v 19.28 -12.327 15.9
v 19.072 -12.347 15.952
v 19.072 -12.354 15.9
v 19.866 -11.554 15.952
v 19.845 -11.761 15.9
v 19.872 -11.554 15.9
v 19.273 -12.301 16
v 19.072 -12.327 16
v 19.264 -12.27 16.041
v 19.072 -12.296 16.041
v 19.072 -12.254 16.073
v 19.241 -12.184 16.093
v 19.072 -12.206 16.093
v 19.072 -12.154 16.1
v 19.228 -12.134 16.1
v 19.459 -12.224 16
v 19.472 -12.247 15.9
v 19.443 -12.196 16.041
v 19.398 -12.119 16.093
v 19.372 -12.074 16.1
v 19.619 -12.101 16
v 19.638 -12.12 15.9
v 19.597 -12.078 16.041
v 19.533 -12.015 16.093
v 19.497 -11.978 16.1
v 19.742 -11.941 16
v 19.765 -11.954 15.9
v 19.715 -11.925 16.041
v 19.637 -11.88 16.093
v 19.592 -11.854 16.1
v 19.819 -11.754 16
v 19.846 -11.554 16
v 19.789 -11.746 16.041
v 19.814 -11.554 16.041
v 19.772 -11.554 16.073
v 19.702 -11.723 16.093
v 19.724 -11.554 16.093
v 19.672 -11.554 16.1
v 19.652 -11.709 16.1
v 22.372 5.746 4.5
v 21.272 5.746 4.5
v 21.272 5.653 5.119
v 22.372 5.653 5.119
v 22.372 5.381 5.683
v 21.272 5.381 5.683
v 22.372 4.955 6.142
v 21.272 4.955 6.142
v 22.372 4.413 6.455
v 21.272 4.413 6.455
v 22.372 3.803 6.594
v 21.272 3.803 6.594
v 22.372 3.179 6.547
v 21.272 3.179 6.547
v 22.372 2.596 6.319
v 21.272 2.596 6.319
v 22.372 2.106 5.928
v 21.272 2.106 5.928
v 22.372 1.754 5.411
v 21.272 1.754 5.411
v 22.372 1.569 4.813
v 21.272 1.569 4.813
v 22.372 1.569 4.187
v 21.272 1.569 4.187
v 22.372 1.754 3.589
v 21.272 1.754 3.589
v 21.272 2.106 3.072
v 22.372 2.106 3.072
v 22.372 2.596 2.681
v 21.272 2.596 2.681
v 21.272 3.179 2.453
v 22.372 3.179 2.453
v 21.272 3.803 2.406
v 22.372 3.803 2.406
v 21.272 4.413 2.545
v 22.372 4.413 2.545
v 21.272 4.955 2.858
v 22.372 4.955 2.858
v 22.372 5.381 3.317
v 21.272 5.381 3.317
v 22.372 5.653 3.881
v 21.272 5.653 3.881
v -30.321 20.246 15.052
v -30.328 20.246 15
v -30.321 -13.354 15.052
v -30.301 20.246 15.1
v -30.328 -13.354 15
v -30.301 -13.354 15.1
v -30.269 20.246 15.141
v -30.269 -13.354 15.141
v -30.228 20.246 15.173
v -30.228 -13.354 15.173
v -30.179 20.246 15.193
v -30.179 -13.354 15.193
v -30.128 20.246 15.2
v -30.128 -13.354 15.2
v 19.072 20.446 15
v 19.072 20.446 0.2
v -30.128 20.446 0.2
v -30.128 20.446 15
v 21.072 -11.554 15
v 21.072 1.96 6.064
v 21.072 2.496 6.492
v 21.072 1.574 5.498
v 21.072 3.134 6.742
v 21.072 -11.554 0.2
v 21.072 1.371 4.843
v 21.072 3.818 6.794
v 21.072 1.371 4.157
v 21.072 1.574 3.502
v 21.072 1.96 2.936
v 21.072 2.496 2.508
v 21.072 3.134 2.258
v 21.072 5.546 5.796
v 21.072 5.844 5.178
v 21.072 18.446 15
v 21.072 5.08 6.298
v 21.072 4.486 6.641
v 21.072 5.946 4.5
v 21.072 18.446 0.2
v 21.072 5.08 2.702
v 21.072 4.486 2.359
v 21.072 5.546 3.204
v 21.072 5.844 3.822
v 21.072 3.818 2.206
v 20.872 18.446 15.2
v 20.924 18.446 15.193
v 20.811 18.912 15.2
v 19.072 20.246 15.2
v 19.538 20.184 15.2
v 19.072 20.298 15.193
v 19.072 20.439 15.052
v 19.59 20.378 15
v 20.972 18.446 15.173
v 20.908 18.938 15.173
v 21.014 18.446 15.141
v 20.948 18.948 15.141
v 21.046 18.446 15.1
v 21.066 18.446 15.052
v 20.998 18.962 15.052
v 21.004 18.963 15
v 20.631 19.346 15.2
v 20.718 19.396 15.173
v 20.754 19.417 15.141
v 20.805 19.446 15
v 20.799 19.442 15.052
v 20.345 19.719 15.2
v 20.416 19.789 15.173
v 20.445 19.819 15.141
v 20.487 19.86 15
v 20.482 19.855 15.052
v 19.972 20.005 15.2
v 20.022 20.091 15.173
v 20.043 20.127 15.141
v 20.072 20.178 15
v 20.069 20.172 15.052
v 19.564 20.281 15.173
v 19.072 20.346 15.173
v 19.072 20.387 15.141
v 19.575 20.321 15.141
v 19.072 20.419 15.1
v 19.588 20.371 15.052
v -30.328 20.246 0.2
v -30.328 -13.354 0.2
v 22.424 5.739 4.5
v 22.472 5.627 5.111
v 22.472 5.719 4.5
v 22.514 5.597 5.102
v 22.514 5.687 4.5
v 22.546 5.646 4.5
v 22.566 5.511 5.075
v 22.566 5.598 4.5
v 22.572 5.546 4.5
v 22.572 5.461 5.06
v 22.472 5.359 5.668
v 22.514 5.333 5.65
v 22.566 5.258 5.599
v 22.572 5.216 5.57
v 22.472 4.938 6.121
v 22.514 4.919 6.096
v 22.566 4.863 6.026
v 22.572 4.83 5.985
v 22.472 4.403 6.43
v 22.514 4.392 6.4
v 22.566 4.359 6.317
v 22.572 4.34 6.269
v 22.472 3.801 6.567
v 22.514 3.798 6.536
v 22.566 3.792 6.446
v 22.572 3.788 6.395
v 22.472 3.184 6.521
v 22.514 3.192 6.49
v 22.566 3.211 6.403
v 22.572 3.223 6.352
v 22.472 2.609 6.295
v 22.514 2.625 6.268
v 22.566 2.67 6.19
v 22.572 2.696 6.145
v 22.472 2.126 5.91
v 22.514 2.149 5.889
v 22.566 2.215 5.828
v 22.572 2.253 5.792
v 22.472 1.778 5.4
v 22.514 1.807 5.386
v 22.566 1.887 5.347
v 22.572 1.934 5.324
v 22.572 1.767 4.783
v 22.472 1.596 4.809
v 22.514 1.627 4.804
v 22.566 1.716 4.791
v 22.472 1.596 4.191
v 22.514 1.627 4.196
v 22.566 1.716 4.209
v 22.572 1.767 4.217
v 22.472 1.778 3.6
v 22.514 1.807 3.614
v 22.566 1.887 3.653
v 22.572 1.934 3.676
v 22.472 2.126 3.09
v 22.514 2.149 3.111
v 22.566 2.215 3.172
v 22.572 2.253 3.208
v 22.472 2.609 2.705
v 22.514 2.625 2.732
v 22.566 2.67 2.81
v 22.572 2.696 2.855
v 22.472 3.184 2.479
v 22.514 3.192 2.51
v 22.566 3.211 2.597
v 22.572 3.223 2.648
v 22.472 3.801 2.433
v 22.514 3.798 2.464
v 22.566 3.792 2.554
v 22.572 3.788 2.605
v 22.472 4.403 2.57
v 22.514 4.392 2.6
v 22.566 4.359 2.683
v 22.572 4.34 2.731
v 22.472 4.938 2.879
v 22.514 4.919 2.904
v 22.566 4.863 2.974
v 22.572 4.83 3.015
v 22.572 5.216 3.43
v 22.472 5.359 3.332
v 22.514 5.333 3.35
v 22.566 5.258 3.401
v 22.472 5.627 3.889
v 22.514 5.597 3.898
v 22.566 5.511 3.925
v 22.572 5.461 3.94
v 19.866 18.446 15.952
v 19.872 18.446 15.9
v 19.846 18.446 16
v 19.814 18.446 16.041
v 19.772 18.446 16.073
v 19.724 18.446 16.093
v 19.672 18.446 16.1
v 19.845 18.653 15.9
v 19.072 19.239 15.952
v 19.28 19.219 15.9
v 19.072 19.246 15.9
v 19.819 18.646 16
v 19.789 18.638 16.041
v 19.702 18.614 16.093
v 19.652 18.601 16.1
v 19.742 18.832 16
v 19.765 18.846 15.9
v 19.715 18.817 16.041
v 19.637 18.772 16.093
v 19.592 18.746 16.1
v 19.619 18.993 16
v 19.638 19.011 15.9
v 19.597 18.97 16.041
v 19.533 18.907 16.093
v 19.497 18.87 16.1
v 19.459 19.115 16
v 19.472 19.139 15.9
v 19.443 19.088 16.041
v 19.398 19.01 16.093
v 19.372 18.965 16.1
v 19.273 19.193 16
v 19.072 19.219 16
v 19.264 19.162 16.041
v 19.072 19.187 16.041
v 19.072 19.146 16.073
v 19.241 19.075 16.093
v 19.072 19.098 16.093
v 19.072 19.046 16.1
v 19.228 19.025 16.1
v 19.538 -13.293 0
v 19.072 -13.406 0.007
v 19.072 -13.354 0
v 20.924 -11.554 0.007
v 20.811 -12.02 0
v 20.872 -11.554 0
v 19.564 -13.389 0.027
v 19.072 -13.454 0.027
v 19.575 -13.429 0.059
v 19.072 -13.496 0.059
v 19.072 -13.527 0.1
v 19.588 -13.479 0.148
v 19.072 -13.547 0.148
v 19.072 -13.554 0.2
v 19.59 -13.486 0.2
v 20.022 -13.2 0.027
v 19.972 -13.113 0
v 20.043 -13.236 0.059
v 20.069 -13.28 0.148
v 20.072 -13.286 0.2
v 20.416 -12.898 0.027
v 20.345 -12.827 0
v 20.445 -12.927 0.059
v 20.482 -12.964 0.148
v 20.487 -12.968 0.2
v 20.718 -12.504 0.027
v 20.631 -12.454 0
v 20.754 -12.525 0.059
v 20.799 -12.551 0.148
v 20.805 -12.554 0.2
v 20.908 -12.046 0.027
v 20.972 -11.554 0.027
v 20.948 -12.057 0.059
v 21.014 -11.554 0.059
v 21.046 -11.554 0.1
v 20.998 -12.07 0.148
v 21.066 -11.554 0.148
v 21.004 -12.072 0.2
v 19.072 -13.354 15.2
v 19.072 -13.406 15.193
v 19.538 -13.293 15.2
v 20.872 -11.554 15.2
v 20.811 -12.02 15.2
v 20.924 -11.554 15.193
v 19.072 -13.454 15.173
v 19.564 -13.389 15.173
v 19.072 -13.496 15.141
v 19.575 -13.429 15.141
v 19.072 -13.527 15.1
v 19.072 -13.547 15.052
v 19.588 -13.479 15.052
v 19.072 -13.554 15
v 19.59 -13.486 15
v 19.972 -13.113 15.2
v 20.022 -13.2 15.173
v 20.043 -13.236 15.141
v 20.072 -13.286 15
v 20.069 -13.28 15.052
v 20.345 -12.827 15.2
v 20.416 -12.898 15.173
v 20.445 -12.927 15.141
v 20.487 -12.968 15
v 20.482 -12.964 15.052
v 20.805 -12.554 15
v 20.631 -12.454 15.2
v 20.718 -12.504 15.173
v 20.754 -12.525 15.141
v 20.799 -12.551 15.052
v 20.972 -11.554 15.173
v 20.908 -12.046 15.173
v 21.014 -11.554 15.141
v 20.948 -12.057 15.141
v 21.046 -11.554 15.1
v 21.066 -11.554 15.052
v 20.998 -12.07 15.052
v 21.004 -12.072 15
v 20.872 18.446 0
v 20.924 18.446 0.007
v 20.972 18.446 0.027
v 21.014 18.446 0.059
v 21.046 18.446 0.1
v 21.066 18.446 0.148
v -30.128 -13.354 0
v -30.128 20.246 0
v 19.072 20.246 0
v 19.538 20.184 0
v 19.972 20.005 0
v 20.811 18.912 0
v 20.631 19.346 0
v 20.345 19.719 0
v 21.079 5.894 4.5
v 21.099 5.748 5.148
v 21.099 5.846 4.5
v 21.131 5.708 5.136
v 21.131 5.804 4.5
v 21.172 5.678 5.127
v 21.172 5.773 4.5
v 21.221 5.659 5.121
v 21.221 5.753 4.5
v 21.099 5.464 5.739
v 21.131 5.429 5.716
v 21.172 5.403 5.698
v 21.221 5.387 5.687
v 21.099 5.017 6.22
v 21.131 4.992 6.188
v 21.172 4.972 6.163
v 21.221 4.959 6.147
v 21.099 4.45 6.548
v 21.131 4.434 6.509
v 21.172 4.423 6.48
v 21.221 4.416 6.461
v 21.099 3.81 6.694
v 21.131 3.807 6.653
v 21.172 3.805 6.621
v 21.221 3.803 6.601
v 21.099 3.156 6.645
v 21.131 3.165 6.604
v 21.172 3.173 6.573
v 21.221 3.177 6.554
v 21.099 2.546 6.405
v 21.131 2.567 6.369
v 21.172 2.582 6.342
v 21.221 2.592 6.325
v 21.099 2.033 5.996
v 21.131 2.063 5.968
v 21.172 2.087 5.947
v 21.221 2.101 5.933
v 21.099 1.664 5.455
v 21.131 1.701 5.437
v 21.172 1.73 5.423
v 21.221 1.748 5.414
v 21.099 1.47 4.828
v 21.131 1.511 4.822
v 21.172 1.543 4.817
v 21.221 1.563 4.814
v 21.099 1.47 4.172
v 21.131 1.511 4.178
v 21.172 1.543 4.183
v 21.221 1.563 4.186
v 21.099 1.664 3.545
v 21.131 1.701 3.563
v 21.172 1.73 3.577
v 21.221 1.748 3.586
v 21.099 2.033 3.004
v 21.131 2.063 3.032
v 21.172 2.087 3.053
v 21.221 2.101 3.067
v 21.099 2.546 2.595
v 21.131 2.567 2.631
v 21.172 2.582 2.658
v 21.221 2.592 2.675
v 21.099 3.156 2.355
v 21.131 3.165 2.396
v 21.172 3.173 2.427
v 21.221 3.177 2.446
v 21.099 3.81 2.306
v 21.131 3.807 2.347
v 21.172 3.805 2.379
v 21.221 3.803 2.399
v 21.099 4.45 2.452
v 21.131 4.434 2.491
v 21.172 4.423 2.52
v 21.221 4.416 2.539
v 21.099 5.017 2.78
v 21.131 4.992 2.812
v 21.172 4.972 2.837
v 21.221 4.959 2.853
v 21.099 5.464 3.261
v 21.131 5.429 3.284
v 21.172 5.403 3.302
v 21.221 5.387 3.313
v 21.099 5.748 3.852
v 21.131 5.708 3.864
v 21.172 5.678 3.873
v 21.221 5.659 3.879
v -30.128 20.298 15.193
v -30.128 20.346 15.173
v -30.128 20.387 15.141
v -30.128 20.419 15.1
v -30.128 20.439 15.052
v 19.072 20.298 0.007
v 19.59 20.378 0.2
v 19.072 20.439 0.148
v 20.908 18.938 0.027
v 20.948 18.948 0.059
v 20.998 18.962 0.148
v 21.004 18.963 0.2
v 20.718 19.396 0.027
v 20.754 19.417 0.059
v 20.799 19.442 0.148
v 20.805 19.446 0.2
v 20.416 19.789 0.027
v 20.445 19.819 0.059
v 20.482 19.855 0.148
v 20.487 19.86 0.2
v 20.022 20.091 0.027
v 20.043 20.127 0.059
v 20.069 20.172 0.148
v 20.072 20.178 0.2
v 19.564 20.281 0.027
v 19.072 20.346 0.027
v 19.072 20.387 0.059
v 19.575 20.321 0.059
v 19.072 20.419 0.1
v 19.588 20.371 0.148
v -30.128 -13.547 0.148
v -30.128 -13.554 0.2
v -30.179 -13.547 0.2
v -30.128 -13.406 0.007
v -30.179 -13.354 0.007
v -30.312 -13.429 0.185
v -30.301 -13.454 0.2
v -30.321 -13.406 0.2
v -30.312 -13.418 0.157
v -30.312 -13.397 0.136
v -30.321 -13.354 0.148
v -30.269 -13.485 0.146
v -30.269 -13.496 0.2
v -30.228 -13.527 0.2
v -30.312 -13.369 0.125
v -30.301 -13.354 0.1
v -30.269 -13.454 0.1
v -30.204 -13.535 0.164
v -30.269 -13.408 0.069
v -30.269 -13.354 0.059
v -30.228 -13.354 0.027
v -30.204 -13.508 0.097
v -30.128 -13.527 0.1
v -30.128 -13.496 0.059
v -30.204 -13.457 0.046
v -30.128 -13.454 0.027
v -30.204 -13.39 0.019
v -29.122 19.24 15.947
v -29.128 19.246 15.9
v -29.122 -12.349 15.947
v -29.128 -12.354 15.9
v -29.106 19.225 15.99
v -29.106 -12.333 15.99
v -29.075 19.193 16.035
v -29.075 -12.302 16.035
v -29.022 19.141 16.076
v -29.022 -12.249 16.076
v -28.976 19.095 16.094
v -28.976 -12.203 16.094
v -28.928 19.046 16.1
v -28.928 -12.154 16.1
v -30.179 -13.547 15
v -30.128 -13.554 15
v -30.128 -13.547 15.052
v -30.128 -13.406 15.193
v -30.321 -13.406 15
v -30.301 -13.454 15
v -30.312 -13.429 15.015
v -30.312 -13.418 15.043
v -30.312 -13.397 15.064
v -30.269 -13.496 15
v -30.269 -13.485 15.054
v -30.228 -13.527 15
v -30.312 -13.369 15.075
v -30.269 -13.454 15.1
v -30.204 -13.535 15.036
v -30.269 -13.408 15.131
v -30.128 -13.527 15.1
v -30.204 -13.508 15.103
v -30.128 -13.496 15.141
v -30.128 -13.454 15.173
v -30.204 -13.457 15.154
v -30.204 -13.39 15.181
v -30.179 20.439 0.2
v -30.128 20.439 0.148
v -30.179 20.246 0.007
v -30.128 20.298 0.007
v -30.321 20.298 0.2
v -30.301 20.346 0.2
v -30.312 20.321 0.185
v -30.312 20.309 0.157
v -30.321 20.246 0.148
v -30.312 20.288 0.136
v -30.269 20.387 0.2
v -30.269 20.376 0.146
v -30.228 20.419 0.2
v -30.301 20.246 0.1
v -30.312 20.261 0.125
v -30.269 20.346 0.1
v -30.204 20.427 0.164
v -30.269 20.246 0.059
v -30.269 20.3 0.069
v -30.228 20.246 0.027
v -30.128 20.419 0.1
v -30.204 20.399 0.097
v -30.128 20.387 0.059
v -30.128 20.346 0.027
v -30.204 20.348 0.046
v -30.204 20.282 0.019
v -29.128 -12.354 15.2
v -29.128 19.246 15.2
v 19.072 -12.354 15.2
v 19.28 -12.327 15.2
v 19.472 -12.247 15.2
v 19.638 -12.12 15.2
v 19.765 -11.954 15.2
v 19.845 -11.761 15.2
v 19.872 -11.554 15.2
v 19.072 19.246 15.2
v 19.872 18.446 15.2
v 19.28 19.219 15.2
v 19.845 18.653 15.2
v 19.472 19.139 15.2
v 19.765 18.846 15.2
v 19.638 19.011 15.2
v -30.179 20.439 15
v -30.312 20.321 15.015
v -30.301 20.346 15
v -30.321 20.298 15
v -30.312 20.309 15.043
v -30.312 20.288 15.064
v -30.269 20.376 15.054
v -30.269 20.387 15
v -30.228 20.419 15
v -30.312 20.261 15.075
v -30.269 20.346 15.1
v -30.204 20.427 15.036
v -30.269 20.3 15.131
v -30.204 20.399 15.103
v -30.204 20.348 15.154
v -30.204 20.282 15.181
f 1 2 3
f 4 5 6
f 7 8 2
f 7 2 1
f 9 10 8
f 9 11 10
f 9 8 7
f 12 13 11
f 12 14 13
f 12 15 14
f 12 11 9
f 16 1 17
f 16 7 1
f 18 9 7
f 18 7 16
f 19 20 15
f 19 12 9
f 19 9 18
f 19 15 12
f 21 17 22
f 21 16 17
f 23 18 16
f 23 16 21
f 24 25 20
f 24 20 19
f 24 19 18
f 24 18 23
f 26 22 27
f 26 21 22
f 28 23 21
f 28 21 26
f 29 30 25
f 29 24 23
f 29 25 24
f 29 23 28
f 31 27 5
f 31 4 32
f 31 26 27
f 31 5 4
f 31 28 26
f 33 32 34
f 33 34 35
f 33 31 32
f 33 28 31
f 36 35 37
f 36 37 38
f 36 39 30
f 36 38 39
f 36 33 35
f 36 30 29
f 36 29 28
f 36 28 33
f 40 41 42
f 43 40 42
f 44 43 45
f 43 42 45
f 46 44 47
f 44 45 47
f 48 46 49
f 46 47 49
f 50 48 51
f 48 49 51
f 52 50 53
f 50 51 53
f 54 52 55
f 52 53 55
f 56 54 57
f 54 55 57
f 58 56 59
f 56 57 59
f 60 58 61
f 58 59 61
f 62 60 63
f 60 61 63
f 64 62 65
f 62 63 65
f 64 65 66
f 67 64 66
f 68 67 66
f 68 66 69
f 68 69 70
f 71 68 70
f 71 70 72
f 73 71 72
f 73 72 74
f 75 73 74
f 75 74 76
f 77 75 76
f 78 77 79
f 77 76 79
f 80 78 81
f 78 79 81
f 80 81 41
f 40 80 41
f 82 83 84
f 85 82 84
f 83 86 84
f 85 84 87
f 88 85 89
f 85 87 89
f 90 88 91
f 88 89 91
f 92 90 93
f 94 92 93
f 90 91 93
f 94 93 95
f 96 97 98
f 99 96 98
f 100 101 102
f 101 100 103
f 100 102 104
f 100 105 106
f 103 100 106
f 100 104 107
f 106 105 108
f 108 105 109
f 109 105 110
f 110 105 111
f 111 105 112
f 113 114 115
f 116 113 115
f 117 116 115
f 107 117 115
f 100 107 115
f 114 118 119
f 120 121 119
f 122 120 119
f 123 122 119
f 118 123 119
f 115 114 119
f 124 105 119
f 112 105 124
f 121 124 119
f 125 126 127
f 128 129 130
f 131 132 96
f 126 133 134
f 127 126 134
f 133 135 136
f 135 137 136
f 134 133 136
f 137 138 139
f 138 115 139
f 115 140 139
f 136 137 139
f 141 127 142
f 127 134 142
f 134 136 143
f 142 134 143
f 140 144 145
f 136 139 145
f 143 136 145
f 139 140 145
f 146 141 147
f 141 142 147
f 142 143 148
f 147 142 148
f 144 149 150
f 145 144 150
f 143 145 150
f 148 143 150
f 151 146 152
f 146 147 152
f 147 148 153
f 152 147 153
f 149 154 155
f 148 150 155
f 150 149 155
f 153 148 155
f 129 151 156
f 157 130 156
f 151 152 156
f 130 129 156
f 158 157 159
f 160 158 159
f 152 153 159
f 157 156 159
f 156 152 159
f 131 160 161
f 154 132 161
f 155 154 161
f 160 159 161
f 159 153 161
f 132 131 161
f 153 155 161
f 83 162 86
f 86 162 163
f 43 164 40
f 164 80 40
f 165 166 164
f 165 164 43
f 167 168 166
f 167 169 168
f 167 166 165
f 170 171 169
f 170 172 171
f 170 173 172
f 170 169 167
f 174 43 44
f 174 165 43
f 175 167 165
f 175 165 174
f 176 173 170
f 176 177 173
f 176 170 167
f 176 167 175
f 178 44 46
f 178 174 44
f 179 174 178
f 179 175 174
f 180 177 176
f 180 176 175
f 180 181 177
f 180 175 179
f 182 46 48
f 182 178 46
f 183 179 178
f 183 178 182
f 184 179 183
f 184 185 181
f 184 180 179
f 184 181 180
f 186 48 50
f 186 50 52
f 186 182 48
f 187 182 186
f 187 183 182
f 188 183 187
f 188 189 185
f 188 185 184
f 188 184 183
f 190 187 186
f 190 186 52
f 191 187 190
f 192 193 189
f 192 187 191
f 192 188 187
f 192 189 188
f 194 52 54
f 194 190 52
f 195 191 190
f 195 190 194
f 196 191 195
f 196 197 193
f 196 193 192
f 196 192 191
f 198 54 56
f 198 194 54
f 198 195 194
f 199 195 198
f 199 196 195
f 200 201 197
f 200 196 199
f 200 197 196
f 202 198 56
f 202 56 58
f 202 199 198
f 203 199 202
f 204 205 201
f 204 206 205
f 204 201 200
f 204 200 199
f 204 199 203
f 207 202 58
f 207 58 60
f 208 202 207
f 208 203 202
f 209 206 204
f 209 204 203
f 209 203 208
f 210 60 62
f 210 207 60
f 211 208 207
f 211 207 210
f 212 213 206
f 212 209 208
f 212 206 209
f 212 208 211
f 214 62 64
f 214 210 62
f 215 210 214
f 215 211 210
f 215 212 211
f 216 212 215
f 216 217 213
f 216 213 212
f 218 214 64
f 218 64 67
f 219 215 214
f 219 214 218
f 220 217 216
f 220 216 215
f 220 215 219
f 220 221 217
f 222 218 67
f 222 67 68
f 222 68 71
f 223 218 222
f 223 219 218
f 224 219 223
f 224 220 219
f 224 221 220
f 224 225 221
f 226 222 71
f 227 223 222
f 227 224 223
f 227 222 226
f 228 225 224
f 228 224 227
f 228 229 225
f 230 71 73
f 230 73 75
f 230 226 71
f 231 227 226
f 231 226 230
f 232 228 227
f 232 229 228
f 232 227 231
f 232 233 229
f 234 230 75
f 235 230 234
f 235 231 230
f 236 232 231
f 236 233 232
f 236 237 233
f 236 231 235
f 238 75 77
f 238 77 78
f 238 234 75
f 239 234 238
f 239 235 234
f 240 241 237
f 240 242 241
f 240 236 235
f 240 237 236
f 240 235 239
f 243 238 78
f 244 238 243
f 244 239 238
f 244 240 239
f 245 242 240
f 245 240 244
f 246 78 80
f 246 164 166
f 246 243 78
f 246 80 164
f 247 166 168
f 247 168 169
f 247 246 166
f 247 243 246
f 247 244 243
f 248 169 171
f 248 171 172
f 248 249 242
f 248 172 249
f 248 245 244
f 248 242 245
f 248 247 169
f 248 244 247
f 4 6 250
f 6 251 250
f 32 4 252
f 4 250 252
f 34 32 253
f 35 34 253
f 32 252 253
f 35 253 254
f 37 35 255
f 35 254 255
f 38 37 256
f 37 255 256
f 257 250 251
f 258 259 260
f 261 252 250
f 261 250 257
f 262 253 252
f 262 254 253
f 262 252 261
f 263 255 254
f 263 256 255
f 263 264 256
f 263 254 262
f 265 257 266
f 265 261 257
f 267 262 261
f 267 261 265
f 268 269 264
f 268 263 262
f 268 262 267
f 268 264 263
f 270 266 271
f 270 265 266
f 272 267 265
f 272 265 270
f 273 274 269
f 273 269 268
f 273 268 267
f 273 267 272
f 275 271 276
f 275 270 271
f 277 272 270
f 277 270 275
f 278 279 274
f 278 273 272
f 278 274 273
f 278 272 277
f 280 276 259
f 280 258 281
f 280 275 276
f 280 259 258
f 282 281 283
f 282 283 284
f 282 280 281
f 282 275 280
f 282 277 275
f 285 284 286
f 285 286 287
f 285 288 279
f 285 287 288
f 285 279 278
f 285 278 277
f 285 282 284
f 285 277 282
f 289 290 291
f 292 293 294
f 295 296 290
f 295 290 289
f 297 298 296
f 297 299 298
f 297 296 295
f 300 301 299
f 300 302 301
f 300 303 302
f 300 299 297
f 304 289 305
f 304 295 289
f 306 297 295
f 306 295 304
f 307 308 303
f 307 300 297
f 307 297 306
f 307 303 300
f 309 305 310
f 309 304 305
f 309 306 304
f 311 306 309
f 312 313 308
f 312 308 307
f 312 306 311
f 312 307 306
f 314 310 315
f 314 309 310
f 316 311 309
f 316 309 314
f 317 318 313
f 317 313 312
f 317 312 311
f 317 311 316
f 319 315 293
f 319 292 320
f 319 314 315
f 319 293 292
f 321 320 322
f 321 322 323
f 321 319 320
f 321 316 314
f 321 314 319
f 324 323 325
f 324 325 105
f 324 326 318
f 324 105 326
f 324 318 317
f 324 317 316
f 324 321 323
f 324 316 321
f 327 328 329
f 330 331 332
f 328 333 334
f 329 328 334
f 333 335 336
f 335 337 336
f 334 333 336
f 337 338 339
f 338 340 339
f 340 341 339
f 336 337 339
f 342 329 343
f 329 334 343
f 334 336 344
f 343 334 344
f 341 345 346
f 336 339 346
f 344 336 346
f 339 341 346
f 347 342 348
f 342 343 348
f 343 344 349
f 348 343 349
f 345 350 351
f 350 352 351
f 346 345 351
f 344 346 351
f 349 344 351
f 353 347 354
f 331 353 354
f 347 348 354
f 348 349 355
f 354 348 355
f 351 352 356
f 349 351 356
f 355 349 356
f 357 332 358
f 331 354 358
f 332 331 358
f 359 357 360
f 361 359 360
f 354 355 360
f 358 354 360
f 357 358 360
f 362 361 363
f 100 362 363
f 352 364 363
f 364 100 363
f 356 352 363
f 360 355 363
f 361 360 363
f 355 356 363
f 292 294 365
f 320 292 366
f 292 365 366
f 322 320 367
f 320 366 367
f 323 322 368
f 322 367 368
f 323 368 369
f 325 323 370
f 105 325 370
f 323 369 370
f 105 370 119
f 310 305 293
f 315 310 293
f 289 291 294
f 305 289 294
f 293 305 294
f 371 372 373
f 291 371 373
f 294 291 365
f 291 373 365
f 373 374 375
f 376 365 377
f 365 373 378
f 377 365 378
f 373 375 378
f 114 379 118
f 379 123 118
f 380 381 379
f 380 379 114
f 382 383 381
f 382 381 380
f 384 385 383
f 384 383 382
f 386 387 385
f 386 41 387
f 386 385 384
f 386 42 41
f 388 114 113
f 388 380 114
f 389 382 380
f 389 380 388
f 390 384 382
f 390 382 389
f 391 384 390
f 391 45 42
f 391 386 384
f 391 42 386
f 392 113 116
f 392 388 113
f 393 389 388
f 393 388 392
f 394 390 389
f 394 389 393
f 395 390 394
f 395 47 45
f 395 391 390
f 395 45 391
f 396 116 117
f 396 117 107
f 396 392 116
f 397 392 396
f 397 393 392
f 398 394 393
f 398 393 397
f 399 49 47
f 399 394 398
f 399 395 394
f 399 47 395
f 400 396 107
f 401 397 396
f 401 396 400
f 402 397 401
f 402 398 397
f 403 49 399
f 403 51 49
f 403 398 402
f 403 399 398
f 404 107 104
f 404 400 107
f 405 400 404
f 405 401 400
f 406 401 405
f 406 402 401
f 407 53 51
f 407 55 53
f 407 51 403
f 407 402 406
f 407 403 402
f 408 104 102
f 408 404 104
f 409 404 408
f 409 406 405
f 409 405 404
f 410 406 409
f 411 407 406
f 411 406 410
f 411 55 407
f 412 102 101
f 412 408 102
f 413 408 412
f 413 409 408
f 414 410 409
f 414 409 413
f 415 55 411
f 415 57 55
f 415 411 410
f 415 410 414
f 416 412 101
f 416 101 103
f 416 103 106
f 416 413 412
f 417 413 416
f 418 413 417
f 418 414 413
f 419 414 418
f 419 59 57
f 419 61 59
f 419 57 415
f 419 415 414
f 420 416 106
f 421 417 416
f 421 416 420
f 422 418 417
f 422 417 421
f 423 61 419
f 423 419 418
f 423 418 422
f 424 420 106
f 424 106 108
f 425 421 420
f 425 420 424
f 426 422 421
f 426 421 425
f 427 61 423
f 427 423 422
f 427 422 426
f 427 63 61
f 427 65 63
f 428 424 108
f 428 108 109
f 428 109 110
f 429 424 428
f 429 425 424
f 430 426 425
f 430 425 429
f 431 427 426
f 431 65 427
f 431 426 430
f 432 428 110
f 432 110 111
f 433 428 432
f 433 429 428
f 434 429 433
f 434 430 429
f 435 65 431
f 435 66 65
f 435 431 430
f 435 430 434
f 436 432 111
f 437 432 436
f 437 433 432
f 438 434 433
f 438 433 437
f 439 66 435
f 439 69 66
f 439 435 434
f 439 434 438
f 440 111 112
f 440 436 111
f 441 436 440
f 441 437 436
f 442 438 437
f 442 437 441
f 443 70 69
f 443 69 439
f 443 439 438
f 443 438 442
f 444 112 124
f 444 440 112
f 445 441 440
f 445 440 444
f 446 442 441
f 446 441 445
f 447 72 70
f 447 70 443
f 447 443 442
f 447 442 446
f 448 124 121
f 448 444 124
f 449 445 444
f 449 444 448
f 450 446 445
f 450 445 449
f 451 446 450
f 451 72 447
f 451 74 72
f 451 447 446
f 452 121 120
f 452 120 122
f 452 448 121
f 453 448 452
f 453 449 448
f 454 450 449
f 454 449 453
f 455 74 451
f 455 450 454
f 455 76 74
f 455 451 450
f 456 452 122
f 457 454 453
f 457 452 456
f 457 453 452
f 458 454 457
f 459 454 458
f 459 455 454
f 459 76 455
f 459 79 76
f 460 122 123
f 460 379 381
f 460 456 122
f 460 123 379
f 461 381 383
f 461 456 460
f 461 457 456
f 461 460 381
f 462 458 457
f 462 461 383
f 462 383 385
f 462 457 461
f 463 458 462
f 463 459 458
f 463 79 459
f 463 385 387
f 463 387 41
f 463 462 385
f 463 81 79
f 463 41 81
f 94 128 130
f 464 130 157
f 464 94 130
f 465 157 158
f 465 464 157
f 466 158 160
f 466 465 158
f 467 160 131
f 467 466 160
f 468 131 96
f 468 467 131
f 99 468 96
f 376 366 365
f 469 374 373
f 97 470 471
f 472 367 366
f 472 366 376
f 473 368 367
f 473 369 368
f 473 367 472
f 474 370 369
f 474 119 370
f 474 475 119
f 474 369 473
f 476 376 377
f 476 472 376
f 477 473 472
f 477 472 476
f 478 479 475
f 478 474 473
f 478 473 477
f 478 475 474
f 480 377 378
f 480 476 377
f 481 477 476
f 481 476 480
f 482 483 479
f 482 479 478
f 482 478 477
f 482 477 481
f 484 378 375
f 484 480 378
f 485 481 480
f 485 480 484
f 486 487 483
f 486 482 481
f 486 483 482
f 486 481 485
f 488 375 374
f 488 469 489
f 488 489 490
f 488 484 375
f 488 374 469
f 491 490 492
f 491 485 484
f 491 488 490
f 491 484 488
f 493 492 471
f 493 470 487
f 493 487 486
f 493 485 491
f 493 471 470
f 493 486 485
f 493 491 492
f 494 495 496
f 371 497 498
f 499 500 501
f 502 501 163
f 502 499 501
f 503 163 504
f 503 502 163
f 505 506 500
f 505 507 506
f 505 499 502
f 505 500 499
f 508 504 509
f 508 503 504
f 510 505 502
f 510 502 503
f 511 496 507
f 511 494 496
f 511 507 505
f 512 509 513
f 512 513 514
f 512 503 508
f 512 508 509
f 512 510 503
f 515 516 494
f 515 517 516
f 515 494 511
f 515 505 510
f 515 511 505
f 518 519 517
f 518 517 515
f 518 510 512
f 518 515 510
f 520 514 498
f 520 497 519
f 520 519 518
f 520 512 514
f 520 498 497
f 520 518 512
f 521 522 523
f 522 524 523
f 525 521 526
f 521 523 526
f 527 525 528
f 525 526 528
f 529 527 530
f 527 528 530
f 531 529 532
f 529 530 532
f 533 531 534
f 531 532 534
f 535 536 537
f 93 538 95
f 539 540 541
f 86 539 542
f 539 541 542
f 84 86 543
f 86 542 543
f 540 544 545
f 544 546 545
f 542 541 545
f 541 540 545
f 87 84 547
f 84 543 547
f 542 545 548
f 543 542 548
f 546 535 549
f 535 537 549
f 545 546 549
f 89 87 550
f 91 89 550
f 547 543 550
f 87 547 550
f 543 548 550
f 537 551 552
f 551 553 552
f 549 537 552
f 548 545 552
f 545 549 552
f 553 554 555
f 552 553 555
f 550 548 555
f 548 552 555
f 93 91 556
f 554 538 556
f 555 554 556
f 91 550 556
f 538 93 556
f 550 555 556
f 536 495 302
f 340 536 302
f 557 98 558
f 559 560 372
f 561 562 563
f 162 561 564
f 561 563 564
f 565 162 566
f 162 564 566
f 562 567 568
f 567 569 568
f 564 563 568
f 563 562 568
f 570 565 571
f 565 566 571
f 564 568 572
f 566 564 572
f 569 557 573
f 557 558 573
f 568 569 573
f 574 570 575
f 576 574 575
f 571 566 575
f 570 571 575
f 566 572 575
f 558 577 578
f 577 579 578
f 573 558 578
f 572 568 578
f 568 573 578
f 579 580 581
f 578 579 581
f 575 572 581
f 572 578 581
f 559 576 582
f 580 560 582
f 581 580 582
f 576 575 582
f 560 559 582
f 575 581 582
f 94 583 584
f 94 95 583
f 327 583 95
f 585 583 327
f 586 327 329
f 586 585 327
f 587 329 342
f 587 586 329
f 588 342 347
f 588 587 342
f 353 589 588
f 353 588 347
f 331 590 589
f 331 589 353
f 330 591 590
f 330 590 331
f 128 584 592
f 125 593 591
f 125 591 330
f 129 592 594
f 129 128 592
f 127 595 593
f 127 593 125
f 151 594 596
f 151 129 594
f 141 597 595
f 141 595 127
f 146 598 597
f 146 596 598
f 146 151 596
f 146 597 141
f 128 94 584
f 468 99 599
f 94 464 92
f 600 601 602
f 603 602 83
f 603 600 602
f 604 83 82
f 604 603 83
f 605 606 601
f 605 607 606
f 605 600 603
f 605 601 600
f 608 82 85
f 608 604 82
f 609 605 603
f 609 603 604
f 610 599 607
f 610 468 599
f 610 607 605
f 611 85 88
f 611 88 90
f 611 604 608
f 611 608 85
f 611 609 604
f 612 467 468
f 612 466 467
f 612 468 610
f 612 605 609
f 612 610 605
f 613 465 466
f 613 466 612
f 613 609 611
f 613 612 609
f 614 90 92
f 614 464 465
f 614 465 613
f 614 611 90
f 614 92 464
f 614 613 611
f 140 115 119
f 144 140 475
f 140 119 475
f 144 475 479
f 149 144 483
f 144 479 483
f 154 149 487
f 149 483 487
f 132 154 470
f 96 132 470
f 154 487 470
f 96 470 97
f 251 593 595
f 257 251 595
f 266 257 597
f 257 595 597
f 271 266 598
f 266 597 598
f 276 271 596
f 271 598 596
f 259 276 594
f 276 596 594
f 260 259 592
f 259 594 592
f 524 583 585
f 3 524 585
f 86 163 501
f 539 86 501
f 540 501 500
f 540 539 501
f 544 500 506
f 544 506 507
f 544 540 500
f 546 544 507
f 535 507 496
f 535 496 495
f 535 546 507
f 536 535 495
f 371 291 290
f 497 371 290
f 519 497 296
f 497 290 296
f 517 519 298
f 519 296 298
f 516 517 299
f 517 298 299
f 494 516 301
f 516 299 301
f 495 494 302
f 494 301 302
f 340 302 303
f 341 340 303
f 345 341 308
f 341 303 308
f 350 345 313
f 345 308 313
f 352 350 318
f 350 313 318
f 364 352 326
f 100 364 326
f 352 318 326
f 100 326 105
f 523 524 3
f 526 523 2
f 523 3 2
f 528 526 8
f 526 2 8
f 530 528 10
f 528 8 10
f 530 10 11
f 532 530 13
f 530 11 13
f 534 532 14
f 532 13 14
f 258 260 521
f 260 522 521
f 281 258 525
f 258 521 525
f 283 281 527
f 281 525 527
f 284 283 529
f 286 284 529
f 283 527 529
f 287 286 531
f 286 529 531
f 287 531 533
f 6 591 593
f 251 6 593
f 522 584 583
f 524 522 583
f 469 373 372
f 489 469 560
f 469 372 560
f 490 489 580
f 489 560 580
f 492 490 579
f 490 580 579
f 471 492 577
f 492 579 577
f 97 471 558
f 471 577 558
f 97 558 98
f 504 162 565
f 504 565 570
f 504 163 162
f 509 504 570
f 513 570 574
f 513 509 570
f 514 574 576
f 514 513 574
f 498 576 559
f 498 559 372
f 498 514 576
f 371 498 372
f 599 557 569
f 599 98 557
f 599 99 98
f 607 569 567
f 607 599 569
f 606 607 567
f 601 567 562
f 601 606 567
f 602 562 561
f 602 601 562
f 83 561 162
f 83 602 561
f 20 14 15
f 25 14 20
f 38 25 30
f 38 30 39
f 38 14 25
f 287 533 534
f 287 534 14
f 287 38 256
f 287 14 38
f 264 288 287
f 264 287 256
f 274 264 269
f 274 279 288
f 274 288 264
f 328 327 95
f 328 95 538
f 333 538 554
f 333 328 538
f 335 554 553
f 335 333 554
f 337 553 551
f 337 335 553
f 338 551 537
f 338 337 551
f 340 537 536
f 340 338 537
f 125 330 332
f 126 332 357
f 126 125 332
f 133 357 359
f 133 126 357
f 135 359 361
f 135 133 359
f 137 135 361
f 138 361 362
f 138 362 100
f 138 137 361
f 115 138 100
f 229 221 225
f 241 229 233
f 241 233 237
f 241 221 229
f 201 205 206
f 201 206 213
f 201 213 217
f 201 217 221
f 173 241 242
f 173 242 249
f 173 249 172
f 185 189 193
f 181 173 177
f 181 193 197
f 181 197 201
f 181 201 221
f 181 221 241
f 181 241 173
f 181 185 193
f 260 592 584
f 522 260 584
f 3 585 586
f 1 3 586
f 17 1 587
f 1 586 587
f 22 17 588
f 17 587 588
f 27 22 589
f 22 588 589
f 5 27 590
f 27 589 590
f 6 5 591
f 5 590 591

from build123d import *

# Parameters (mm, degrees)
F1_DEPTH = 15.2
F2_R     = 2.1
F3_DEPTH = 1.5
F4_R     = 0.2
F6_DEPTH = 0.9
F7_R     = 0.2


with BuildPart() as f1:
    # F0 (on Top) → F1 (new body)
    with BuildSketch(Plane.XY):
        with BuildLine():
            Line((19.072499, 20.445805), (-30.327501, 20.445805))
            Line((-30.327501, 20.445805), (-30.327501, -13.554195))
            Line((-30.327501, -13.554195), (19.072499, -13.554195))
            ThreePointArc((19.072499, -13.554195), (20.486712, -12.968409), (21.072499, -11.554195))
            Line((21.072499, -11.554195), (21.072499, 18.445805))
            ThreePointArc((21.072499, 18.445805), (20.486712, 19.860018), (19.072499, 20.445805))
        make_face()
    extrude(amount=F1_DEPTH)

    # F2 (on face) → F3 (join)
    with BuildSketch(Plane.YZ.offset(21.072499)):
        with Locations((3.645805, 4.5)):
            Circle(F2_R)
    extrude(amount=F3_DEPTH)

    # F4
    f4_edges = [f1.edges().sort_by_distance(p)[0] for p in [
        (21.072499, 3.445805, 15.2),
        (21.072499, 3.445805, 0),
        (22.572499, 1.545805, 4.5),
        (21.072499, 1.545805, 4.5),
        (-30.327501, 20.445805, 7.6),
        (-30.327501, -13.554195, 7.6),
        (-30.327501, 3.445805, 15.2),
        (-30.327501, 3.445805, 0),
    ]]
    fillet(f4_edges, radius=F4_R)

    # F5 (on face) → F6 (join)
    with BuildSketch(Plane.XY.offset(15.2)):
        with BuildLine():
            Line((-29.127501, 19.245805), (-29.127501, -12.354195))
            Line((-29.127501, -12.354195), (19.072499, -12.354195))
            ThreePointArc((19.072499, -12.354195), (19.638184, -12.119881), (19.872499, -11.554195))
            Line((19.872499, -11.554195), (19.872499, 18.445805))
            ThreePointArc((19.872499, 18.445805), (19.638184, 19.01149), (19.072499, 19.245805))
            Line((19.072499, 19.245805), (-29.127501, 19.245805))
        make_face()
    extrude(amount=F6_DEPTH)

    # F7
    f7_edges = [f1.edges().sort_by_distance(p)[0] for p in [
        (-5.027501, -12.354195, 16.1),
        (19.638184, -12.119881, 16.1),
        (19.872499, 3.445805, 16.1),
        (19.638184, 19.01149, 16.1),
        (-5.027501, 19.245805, 16.1),
        (-29.127501, 3.445805, 16.1),
    ]]
    fillet(f7_edges, radius=F7_R)


solid = f1.part
